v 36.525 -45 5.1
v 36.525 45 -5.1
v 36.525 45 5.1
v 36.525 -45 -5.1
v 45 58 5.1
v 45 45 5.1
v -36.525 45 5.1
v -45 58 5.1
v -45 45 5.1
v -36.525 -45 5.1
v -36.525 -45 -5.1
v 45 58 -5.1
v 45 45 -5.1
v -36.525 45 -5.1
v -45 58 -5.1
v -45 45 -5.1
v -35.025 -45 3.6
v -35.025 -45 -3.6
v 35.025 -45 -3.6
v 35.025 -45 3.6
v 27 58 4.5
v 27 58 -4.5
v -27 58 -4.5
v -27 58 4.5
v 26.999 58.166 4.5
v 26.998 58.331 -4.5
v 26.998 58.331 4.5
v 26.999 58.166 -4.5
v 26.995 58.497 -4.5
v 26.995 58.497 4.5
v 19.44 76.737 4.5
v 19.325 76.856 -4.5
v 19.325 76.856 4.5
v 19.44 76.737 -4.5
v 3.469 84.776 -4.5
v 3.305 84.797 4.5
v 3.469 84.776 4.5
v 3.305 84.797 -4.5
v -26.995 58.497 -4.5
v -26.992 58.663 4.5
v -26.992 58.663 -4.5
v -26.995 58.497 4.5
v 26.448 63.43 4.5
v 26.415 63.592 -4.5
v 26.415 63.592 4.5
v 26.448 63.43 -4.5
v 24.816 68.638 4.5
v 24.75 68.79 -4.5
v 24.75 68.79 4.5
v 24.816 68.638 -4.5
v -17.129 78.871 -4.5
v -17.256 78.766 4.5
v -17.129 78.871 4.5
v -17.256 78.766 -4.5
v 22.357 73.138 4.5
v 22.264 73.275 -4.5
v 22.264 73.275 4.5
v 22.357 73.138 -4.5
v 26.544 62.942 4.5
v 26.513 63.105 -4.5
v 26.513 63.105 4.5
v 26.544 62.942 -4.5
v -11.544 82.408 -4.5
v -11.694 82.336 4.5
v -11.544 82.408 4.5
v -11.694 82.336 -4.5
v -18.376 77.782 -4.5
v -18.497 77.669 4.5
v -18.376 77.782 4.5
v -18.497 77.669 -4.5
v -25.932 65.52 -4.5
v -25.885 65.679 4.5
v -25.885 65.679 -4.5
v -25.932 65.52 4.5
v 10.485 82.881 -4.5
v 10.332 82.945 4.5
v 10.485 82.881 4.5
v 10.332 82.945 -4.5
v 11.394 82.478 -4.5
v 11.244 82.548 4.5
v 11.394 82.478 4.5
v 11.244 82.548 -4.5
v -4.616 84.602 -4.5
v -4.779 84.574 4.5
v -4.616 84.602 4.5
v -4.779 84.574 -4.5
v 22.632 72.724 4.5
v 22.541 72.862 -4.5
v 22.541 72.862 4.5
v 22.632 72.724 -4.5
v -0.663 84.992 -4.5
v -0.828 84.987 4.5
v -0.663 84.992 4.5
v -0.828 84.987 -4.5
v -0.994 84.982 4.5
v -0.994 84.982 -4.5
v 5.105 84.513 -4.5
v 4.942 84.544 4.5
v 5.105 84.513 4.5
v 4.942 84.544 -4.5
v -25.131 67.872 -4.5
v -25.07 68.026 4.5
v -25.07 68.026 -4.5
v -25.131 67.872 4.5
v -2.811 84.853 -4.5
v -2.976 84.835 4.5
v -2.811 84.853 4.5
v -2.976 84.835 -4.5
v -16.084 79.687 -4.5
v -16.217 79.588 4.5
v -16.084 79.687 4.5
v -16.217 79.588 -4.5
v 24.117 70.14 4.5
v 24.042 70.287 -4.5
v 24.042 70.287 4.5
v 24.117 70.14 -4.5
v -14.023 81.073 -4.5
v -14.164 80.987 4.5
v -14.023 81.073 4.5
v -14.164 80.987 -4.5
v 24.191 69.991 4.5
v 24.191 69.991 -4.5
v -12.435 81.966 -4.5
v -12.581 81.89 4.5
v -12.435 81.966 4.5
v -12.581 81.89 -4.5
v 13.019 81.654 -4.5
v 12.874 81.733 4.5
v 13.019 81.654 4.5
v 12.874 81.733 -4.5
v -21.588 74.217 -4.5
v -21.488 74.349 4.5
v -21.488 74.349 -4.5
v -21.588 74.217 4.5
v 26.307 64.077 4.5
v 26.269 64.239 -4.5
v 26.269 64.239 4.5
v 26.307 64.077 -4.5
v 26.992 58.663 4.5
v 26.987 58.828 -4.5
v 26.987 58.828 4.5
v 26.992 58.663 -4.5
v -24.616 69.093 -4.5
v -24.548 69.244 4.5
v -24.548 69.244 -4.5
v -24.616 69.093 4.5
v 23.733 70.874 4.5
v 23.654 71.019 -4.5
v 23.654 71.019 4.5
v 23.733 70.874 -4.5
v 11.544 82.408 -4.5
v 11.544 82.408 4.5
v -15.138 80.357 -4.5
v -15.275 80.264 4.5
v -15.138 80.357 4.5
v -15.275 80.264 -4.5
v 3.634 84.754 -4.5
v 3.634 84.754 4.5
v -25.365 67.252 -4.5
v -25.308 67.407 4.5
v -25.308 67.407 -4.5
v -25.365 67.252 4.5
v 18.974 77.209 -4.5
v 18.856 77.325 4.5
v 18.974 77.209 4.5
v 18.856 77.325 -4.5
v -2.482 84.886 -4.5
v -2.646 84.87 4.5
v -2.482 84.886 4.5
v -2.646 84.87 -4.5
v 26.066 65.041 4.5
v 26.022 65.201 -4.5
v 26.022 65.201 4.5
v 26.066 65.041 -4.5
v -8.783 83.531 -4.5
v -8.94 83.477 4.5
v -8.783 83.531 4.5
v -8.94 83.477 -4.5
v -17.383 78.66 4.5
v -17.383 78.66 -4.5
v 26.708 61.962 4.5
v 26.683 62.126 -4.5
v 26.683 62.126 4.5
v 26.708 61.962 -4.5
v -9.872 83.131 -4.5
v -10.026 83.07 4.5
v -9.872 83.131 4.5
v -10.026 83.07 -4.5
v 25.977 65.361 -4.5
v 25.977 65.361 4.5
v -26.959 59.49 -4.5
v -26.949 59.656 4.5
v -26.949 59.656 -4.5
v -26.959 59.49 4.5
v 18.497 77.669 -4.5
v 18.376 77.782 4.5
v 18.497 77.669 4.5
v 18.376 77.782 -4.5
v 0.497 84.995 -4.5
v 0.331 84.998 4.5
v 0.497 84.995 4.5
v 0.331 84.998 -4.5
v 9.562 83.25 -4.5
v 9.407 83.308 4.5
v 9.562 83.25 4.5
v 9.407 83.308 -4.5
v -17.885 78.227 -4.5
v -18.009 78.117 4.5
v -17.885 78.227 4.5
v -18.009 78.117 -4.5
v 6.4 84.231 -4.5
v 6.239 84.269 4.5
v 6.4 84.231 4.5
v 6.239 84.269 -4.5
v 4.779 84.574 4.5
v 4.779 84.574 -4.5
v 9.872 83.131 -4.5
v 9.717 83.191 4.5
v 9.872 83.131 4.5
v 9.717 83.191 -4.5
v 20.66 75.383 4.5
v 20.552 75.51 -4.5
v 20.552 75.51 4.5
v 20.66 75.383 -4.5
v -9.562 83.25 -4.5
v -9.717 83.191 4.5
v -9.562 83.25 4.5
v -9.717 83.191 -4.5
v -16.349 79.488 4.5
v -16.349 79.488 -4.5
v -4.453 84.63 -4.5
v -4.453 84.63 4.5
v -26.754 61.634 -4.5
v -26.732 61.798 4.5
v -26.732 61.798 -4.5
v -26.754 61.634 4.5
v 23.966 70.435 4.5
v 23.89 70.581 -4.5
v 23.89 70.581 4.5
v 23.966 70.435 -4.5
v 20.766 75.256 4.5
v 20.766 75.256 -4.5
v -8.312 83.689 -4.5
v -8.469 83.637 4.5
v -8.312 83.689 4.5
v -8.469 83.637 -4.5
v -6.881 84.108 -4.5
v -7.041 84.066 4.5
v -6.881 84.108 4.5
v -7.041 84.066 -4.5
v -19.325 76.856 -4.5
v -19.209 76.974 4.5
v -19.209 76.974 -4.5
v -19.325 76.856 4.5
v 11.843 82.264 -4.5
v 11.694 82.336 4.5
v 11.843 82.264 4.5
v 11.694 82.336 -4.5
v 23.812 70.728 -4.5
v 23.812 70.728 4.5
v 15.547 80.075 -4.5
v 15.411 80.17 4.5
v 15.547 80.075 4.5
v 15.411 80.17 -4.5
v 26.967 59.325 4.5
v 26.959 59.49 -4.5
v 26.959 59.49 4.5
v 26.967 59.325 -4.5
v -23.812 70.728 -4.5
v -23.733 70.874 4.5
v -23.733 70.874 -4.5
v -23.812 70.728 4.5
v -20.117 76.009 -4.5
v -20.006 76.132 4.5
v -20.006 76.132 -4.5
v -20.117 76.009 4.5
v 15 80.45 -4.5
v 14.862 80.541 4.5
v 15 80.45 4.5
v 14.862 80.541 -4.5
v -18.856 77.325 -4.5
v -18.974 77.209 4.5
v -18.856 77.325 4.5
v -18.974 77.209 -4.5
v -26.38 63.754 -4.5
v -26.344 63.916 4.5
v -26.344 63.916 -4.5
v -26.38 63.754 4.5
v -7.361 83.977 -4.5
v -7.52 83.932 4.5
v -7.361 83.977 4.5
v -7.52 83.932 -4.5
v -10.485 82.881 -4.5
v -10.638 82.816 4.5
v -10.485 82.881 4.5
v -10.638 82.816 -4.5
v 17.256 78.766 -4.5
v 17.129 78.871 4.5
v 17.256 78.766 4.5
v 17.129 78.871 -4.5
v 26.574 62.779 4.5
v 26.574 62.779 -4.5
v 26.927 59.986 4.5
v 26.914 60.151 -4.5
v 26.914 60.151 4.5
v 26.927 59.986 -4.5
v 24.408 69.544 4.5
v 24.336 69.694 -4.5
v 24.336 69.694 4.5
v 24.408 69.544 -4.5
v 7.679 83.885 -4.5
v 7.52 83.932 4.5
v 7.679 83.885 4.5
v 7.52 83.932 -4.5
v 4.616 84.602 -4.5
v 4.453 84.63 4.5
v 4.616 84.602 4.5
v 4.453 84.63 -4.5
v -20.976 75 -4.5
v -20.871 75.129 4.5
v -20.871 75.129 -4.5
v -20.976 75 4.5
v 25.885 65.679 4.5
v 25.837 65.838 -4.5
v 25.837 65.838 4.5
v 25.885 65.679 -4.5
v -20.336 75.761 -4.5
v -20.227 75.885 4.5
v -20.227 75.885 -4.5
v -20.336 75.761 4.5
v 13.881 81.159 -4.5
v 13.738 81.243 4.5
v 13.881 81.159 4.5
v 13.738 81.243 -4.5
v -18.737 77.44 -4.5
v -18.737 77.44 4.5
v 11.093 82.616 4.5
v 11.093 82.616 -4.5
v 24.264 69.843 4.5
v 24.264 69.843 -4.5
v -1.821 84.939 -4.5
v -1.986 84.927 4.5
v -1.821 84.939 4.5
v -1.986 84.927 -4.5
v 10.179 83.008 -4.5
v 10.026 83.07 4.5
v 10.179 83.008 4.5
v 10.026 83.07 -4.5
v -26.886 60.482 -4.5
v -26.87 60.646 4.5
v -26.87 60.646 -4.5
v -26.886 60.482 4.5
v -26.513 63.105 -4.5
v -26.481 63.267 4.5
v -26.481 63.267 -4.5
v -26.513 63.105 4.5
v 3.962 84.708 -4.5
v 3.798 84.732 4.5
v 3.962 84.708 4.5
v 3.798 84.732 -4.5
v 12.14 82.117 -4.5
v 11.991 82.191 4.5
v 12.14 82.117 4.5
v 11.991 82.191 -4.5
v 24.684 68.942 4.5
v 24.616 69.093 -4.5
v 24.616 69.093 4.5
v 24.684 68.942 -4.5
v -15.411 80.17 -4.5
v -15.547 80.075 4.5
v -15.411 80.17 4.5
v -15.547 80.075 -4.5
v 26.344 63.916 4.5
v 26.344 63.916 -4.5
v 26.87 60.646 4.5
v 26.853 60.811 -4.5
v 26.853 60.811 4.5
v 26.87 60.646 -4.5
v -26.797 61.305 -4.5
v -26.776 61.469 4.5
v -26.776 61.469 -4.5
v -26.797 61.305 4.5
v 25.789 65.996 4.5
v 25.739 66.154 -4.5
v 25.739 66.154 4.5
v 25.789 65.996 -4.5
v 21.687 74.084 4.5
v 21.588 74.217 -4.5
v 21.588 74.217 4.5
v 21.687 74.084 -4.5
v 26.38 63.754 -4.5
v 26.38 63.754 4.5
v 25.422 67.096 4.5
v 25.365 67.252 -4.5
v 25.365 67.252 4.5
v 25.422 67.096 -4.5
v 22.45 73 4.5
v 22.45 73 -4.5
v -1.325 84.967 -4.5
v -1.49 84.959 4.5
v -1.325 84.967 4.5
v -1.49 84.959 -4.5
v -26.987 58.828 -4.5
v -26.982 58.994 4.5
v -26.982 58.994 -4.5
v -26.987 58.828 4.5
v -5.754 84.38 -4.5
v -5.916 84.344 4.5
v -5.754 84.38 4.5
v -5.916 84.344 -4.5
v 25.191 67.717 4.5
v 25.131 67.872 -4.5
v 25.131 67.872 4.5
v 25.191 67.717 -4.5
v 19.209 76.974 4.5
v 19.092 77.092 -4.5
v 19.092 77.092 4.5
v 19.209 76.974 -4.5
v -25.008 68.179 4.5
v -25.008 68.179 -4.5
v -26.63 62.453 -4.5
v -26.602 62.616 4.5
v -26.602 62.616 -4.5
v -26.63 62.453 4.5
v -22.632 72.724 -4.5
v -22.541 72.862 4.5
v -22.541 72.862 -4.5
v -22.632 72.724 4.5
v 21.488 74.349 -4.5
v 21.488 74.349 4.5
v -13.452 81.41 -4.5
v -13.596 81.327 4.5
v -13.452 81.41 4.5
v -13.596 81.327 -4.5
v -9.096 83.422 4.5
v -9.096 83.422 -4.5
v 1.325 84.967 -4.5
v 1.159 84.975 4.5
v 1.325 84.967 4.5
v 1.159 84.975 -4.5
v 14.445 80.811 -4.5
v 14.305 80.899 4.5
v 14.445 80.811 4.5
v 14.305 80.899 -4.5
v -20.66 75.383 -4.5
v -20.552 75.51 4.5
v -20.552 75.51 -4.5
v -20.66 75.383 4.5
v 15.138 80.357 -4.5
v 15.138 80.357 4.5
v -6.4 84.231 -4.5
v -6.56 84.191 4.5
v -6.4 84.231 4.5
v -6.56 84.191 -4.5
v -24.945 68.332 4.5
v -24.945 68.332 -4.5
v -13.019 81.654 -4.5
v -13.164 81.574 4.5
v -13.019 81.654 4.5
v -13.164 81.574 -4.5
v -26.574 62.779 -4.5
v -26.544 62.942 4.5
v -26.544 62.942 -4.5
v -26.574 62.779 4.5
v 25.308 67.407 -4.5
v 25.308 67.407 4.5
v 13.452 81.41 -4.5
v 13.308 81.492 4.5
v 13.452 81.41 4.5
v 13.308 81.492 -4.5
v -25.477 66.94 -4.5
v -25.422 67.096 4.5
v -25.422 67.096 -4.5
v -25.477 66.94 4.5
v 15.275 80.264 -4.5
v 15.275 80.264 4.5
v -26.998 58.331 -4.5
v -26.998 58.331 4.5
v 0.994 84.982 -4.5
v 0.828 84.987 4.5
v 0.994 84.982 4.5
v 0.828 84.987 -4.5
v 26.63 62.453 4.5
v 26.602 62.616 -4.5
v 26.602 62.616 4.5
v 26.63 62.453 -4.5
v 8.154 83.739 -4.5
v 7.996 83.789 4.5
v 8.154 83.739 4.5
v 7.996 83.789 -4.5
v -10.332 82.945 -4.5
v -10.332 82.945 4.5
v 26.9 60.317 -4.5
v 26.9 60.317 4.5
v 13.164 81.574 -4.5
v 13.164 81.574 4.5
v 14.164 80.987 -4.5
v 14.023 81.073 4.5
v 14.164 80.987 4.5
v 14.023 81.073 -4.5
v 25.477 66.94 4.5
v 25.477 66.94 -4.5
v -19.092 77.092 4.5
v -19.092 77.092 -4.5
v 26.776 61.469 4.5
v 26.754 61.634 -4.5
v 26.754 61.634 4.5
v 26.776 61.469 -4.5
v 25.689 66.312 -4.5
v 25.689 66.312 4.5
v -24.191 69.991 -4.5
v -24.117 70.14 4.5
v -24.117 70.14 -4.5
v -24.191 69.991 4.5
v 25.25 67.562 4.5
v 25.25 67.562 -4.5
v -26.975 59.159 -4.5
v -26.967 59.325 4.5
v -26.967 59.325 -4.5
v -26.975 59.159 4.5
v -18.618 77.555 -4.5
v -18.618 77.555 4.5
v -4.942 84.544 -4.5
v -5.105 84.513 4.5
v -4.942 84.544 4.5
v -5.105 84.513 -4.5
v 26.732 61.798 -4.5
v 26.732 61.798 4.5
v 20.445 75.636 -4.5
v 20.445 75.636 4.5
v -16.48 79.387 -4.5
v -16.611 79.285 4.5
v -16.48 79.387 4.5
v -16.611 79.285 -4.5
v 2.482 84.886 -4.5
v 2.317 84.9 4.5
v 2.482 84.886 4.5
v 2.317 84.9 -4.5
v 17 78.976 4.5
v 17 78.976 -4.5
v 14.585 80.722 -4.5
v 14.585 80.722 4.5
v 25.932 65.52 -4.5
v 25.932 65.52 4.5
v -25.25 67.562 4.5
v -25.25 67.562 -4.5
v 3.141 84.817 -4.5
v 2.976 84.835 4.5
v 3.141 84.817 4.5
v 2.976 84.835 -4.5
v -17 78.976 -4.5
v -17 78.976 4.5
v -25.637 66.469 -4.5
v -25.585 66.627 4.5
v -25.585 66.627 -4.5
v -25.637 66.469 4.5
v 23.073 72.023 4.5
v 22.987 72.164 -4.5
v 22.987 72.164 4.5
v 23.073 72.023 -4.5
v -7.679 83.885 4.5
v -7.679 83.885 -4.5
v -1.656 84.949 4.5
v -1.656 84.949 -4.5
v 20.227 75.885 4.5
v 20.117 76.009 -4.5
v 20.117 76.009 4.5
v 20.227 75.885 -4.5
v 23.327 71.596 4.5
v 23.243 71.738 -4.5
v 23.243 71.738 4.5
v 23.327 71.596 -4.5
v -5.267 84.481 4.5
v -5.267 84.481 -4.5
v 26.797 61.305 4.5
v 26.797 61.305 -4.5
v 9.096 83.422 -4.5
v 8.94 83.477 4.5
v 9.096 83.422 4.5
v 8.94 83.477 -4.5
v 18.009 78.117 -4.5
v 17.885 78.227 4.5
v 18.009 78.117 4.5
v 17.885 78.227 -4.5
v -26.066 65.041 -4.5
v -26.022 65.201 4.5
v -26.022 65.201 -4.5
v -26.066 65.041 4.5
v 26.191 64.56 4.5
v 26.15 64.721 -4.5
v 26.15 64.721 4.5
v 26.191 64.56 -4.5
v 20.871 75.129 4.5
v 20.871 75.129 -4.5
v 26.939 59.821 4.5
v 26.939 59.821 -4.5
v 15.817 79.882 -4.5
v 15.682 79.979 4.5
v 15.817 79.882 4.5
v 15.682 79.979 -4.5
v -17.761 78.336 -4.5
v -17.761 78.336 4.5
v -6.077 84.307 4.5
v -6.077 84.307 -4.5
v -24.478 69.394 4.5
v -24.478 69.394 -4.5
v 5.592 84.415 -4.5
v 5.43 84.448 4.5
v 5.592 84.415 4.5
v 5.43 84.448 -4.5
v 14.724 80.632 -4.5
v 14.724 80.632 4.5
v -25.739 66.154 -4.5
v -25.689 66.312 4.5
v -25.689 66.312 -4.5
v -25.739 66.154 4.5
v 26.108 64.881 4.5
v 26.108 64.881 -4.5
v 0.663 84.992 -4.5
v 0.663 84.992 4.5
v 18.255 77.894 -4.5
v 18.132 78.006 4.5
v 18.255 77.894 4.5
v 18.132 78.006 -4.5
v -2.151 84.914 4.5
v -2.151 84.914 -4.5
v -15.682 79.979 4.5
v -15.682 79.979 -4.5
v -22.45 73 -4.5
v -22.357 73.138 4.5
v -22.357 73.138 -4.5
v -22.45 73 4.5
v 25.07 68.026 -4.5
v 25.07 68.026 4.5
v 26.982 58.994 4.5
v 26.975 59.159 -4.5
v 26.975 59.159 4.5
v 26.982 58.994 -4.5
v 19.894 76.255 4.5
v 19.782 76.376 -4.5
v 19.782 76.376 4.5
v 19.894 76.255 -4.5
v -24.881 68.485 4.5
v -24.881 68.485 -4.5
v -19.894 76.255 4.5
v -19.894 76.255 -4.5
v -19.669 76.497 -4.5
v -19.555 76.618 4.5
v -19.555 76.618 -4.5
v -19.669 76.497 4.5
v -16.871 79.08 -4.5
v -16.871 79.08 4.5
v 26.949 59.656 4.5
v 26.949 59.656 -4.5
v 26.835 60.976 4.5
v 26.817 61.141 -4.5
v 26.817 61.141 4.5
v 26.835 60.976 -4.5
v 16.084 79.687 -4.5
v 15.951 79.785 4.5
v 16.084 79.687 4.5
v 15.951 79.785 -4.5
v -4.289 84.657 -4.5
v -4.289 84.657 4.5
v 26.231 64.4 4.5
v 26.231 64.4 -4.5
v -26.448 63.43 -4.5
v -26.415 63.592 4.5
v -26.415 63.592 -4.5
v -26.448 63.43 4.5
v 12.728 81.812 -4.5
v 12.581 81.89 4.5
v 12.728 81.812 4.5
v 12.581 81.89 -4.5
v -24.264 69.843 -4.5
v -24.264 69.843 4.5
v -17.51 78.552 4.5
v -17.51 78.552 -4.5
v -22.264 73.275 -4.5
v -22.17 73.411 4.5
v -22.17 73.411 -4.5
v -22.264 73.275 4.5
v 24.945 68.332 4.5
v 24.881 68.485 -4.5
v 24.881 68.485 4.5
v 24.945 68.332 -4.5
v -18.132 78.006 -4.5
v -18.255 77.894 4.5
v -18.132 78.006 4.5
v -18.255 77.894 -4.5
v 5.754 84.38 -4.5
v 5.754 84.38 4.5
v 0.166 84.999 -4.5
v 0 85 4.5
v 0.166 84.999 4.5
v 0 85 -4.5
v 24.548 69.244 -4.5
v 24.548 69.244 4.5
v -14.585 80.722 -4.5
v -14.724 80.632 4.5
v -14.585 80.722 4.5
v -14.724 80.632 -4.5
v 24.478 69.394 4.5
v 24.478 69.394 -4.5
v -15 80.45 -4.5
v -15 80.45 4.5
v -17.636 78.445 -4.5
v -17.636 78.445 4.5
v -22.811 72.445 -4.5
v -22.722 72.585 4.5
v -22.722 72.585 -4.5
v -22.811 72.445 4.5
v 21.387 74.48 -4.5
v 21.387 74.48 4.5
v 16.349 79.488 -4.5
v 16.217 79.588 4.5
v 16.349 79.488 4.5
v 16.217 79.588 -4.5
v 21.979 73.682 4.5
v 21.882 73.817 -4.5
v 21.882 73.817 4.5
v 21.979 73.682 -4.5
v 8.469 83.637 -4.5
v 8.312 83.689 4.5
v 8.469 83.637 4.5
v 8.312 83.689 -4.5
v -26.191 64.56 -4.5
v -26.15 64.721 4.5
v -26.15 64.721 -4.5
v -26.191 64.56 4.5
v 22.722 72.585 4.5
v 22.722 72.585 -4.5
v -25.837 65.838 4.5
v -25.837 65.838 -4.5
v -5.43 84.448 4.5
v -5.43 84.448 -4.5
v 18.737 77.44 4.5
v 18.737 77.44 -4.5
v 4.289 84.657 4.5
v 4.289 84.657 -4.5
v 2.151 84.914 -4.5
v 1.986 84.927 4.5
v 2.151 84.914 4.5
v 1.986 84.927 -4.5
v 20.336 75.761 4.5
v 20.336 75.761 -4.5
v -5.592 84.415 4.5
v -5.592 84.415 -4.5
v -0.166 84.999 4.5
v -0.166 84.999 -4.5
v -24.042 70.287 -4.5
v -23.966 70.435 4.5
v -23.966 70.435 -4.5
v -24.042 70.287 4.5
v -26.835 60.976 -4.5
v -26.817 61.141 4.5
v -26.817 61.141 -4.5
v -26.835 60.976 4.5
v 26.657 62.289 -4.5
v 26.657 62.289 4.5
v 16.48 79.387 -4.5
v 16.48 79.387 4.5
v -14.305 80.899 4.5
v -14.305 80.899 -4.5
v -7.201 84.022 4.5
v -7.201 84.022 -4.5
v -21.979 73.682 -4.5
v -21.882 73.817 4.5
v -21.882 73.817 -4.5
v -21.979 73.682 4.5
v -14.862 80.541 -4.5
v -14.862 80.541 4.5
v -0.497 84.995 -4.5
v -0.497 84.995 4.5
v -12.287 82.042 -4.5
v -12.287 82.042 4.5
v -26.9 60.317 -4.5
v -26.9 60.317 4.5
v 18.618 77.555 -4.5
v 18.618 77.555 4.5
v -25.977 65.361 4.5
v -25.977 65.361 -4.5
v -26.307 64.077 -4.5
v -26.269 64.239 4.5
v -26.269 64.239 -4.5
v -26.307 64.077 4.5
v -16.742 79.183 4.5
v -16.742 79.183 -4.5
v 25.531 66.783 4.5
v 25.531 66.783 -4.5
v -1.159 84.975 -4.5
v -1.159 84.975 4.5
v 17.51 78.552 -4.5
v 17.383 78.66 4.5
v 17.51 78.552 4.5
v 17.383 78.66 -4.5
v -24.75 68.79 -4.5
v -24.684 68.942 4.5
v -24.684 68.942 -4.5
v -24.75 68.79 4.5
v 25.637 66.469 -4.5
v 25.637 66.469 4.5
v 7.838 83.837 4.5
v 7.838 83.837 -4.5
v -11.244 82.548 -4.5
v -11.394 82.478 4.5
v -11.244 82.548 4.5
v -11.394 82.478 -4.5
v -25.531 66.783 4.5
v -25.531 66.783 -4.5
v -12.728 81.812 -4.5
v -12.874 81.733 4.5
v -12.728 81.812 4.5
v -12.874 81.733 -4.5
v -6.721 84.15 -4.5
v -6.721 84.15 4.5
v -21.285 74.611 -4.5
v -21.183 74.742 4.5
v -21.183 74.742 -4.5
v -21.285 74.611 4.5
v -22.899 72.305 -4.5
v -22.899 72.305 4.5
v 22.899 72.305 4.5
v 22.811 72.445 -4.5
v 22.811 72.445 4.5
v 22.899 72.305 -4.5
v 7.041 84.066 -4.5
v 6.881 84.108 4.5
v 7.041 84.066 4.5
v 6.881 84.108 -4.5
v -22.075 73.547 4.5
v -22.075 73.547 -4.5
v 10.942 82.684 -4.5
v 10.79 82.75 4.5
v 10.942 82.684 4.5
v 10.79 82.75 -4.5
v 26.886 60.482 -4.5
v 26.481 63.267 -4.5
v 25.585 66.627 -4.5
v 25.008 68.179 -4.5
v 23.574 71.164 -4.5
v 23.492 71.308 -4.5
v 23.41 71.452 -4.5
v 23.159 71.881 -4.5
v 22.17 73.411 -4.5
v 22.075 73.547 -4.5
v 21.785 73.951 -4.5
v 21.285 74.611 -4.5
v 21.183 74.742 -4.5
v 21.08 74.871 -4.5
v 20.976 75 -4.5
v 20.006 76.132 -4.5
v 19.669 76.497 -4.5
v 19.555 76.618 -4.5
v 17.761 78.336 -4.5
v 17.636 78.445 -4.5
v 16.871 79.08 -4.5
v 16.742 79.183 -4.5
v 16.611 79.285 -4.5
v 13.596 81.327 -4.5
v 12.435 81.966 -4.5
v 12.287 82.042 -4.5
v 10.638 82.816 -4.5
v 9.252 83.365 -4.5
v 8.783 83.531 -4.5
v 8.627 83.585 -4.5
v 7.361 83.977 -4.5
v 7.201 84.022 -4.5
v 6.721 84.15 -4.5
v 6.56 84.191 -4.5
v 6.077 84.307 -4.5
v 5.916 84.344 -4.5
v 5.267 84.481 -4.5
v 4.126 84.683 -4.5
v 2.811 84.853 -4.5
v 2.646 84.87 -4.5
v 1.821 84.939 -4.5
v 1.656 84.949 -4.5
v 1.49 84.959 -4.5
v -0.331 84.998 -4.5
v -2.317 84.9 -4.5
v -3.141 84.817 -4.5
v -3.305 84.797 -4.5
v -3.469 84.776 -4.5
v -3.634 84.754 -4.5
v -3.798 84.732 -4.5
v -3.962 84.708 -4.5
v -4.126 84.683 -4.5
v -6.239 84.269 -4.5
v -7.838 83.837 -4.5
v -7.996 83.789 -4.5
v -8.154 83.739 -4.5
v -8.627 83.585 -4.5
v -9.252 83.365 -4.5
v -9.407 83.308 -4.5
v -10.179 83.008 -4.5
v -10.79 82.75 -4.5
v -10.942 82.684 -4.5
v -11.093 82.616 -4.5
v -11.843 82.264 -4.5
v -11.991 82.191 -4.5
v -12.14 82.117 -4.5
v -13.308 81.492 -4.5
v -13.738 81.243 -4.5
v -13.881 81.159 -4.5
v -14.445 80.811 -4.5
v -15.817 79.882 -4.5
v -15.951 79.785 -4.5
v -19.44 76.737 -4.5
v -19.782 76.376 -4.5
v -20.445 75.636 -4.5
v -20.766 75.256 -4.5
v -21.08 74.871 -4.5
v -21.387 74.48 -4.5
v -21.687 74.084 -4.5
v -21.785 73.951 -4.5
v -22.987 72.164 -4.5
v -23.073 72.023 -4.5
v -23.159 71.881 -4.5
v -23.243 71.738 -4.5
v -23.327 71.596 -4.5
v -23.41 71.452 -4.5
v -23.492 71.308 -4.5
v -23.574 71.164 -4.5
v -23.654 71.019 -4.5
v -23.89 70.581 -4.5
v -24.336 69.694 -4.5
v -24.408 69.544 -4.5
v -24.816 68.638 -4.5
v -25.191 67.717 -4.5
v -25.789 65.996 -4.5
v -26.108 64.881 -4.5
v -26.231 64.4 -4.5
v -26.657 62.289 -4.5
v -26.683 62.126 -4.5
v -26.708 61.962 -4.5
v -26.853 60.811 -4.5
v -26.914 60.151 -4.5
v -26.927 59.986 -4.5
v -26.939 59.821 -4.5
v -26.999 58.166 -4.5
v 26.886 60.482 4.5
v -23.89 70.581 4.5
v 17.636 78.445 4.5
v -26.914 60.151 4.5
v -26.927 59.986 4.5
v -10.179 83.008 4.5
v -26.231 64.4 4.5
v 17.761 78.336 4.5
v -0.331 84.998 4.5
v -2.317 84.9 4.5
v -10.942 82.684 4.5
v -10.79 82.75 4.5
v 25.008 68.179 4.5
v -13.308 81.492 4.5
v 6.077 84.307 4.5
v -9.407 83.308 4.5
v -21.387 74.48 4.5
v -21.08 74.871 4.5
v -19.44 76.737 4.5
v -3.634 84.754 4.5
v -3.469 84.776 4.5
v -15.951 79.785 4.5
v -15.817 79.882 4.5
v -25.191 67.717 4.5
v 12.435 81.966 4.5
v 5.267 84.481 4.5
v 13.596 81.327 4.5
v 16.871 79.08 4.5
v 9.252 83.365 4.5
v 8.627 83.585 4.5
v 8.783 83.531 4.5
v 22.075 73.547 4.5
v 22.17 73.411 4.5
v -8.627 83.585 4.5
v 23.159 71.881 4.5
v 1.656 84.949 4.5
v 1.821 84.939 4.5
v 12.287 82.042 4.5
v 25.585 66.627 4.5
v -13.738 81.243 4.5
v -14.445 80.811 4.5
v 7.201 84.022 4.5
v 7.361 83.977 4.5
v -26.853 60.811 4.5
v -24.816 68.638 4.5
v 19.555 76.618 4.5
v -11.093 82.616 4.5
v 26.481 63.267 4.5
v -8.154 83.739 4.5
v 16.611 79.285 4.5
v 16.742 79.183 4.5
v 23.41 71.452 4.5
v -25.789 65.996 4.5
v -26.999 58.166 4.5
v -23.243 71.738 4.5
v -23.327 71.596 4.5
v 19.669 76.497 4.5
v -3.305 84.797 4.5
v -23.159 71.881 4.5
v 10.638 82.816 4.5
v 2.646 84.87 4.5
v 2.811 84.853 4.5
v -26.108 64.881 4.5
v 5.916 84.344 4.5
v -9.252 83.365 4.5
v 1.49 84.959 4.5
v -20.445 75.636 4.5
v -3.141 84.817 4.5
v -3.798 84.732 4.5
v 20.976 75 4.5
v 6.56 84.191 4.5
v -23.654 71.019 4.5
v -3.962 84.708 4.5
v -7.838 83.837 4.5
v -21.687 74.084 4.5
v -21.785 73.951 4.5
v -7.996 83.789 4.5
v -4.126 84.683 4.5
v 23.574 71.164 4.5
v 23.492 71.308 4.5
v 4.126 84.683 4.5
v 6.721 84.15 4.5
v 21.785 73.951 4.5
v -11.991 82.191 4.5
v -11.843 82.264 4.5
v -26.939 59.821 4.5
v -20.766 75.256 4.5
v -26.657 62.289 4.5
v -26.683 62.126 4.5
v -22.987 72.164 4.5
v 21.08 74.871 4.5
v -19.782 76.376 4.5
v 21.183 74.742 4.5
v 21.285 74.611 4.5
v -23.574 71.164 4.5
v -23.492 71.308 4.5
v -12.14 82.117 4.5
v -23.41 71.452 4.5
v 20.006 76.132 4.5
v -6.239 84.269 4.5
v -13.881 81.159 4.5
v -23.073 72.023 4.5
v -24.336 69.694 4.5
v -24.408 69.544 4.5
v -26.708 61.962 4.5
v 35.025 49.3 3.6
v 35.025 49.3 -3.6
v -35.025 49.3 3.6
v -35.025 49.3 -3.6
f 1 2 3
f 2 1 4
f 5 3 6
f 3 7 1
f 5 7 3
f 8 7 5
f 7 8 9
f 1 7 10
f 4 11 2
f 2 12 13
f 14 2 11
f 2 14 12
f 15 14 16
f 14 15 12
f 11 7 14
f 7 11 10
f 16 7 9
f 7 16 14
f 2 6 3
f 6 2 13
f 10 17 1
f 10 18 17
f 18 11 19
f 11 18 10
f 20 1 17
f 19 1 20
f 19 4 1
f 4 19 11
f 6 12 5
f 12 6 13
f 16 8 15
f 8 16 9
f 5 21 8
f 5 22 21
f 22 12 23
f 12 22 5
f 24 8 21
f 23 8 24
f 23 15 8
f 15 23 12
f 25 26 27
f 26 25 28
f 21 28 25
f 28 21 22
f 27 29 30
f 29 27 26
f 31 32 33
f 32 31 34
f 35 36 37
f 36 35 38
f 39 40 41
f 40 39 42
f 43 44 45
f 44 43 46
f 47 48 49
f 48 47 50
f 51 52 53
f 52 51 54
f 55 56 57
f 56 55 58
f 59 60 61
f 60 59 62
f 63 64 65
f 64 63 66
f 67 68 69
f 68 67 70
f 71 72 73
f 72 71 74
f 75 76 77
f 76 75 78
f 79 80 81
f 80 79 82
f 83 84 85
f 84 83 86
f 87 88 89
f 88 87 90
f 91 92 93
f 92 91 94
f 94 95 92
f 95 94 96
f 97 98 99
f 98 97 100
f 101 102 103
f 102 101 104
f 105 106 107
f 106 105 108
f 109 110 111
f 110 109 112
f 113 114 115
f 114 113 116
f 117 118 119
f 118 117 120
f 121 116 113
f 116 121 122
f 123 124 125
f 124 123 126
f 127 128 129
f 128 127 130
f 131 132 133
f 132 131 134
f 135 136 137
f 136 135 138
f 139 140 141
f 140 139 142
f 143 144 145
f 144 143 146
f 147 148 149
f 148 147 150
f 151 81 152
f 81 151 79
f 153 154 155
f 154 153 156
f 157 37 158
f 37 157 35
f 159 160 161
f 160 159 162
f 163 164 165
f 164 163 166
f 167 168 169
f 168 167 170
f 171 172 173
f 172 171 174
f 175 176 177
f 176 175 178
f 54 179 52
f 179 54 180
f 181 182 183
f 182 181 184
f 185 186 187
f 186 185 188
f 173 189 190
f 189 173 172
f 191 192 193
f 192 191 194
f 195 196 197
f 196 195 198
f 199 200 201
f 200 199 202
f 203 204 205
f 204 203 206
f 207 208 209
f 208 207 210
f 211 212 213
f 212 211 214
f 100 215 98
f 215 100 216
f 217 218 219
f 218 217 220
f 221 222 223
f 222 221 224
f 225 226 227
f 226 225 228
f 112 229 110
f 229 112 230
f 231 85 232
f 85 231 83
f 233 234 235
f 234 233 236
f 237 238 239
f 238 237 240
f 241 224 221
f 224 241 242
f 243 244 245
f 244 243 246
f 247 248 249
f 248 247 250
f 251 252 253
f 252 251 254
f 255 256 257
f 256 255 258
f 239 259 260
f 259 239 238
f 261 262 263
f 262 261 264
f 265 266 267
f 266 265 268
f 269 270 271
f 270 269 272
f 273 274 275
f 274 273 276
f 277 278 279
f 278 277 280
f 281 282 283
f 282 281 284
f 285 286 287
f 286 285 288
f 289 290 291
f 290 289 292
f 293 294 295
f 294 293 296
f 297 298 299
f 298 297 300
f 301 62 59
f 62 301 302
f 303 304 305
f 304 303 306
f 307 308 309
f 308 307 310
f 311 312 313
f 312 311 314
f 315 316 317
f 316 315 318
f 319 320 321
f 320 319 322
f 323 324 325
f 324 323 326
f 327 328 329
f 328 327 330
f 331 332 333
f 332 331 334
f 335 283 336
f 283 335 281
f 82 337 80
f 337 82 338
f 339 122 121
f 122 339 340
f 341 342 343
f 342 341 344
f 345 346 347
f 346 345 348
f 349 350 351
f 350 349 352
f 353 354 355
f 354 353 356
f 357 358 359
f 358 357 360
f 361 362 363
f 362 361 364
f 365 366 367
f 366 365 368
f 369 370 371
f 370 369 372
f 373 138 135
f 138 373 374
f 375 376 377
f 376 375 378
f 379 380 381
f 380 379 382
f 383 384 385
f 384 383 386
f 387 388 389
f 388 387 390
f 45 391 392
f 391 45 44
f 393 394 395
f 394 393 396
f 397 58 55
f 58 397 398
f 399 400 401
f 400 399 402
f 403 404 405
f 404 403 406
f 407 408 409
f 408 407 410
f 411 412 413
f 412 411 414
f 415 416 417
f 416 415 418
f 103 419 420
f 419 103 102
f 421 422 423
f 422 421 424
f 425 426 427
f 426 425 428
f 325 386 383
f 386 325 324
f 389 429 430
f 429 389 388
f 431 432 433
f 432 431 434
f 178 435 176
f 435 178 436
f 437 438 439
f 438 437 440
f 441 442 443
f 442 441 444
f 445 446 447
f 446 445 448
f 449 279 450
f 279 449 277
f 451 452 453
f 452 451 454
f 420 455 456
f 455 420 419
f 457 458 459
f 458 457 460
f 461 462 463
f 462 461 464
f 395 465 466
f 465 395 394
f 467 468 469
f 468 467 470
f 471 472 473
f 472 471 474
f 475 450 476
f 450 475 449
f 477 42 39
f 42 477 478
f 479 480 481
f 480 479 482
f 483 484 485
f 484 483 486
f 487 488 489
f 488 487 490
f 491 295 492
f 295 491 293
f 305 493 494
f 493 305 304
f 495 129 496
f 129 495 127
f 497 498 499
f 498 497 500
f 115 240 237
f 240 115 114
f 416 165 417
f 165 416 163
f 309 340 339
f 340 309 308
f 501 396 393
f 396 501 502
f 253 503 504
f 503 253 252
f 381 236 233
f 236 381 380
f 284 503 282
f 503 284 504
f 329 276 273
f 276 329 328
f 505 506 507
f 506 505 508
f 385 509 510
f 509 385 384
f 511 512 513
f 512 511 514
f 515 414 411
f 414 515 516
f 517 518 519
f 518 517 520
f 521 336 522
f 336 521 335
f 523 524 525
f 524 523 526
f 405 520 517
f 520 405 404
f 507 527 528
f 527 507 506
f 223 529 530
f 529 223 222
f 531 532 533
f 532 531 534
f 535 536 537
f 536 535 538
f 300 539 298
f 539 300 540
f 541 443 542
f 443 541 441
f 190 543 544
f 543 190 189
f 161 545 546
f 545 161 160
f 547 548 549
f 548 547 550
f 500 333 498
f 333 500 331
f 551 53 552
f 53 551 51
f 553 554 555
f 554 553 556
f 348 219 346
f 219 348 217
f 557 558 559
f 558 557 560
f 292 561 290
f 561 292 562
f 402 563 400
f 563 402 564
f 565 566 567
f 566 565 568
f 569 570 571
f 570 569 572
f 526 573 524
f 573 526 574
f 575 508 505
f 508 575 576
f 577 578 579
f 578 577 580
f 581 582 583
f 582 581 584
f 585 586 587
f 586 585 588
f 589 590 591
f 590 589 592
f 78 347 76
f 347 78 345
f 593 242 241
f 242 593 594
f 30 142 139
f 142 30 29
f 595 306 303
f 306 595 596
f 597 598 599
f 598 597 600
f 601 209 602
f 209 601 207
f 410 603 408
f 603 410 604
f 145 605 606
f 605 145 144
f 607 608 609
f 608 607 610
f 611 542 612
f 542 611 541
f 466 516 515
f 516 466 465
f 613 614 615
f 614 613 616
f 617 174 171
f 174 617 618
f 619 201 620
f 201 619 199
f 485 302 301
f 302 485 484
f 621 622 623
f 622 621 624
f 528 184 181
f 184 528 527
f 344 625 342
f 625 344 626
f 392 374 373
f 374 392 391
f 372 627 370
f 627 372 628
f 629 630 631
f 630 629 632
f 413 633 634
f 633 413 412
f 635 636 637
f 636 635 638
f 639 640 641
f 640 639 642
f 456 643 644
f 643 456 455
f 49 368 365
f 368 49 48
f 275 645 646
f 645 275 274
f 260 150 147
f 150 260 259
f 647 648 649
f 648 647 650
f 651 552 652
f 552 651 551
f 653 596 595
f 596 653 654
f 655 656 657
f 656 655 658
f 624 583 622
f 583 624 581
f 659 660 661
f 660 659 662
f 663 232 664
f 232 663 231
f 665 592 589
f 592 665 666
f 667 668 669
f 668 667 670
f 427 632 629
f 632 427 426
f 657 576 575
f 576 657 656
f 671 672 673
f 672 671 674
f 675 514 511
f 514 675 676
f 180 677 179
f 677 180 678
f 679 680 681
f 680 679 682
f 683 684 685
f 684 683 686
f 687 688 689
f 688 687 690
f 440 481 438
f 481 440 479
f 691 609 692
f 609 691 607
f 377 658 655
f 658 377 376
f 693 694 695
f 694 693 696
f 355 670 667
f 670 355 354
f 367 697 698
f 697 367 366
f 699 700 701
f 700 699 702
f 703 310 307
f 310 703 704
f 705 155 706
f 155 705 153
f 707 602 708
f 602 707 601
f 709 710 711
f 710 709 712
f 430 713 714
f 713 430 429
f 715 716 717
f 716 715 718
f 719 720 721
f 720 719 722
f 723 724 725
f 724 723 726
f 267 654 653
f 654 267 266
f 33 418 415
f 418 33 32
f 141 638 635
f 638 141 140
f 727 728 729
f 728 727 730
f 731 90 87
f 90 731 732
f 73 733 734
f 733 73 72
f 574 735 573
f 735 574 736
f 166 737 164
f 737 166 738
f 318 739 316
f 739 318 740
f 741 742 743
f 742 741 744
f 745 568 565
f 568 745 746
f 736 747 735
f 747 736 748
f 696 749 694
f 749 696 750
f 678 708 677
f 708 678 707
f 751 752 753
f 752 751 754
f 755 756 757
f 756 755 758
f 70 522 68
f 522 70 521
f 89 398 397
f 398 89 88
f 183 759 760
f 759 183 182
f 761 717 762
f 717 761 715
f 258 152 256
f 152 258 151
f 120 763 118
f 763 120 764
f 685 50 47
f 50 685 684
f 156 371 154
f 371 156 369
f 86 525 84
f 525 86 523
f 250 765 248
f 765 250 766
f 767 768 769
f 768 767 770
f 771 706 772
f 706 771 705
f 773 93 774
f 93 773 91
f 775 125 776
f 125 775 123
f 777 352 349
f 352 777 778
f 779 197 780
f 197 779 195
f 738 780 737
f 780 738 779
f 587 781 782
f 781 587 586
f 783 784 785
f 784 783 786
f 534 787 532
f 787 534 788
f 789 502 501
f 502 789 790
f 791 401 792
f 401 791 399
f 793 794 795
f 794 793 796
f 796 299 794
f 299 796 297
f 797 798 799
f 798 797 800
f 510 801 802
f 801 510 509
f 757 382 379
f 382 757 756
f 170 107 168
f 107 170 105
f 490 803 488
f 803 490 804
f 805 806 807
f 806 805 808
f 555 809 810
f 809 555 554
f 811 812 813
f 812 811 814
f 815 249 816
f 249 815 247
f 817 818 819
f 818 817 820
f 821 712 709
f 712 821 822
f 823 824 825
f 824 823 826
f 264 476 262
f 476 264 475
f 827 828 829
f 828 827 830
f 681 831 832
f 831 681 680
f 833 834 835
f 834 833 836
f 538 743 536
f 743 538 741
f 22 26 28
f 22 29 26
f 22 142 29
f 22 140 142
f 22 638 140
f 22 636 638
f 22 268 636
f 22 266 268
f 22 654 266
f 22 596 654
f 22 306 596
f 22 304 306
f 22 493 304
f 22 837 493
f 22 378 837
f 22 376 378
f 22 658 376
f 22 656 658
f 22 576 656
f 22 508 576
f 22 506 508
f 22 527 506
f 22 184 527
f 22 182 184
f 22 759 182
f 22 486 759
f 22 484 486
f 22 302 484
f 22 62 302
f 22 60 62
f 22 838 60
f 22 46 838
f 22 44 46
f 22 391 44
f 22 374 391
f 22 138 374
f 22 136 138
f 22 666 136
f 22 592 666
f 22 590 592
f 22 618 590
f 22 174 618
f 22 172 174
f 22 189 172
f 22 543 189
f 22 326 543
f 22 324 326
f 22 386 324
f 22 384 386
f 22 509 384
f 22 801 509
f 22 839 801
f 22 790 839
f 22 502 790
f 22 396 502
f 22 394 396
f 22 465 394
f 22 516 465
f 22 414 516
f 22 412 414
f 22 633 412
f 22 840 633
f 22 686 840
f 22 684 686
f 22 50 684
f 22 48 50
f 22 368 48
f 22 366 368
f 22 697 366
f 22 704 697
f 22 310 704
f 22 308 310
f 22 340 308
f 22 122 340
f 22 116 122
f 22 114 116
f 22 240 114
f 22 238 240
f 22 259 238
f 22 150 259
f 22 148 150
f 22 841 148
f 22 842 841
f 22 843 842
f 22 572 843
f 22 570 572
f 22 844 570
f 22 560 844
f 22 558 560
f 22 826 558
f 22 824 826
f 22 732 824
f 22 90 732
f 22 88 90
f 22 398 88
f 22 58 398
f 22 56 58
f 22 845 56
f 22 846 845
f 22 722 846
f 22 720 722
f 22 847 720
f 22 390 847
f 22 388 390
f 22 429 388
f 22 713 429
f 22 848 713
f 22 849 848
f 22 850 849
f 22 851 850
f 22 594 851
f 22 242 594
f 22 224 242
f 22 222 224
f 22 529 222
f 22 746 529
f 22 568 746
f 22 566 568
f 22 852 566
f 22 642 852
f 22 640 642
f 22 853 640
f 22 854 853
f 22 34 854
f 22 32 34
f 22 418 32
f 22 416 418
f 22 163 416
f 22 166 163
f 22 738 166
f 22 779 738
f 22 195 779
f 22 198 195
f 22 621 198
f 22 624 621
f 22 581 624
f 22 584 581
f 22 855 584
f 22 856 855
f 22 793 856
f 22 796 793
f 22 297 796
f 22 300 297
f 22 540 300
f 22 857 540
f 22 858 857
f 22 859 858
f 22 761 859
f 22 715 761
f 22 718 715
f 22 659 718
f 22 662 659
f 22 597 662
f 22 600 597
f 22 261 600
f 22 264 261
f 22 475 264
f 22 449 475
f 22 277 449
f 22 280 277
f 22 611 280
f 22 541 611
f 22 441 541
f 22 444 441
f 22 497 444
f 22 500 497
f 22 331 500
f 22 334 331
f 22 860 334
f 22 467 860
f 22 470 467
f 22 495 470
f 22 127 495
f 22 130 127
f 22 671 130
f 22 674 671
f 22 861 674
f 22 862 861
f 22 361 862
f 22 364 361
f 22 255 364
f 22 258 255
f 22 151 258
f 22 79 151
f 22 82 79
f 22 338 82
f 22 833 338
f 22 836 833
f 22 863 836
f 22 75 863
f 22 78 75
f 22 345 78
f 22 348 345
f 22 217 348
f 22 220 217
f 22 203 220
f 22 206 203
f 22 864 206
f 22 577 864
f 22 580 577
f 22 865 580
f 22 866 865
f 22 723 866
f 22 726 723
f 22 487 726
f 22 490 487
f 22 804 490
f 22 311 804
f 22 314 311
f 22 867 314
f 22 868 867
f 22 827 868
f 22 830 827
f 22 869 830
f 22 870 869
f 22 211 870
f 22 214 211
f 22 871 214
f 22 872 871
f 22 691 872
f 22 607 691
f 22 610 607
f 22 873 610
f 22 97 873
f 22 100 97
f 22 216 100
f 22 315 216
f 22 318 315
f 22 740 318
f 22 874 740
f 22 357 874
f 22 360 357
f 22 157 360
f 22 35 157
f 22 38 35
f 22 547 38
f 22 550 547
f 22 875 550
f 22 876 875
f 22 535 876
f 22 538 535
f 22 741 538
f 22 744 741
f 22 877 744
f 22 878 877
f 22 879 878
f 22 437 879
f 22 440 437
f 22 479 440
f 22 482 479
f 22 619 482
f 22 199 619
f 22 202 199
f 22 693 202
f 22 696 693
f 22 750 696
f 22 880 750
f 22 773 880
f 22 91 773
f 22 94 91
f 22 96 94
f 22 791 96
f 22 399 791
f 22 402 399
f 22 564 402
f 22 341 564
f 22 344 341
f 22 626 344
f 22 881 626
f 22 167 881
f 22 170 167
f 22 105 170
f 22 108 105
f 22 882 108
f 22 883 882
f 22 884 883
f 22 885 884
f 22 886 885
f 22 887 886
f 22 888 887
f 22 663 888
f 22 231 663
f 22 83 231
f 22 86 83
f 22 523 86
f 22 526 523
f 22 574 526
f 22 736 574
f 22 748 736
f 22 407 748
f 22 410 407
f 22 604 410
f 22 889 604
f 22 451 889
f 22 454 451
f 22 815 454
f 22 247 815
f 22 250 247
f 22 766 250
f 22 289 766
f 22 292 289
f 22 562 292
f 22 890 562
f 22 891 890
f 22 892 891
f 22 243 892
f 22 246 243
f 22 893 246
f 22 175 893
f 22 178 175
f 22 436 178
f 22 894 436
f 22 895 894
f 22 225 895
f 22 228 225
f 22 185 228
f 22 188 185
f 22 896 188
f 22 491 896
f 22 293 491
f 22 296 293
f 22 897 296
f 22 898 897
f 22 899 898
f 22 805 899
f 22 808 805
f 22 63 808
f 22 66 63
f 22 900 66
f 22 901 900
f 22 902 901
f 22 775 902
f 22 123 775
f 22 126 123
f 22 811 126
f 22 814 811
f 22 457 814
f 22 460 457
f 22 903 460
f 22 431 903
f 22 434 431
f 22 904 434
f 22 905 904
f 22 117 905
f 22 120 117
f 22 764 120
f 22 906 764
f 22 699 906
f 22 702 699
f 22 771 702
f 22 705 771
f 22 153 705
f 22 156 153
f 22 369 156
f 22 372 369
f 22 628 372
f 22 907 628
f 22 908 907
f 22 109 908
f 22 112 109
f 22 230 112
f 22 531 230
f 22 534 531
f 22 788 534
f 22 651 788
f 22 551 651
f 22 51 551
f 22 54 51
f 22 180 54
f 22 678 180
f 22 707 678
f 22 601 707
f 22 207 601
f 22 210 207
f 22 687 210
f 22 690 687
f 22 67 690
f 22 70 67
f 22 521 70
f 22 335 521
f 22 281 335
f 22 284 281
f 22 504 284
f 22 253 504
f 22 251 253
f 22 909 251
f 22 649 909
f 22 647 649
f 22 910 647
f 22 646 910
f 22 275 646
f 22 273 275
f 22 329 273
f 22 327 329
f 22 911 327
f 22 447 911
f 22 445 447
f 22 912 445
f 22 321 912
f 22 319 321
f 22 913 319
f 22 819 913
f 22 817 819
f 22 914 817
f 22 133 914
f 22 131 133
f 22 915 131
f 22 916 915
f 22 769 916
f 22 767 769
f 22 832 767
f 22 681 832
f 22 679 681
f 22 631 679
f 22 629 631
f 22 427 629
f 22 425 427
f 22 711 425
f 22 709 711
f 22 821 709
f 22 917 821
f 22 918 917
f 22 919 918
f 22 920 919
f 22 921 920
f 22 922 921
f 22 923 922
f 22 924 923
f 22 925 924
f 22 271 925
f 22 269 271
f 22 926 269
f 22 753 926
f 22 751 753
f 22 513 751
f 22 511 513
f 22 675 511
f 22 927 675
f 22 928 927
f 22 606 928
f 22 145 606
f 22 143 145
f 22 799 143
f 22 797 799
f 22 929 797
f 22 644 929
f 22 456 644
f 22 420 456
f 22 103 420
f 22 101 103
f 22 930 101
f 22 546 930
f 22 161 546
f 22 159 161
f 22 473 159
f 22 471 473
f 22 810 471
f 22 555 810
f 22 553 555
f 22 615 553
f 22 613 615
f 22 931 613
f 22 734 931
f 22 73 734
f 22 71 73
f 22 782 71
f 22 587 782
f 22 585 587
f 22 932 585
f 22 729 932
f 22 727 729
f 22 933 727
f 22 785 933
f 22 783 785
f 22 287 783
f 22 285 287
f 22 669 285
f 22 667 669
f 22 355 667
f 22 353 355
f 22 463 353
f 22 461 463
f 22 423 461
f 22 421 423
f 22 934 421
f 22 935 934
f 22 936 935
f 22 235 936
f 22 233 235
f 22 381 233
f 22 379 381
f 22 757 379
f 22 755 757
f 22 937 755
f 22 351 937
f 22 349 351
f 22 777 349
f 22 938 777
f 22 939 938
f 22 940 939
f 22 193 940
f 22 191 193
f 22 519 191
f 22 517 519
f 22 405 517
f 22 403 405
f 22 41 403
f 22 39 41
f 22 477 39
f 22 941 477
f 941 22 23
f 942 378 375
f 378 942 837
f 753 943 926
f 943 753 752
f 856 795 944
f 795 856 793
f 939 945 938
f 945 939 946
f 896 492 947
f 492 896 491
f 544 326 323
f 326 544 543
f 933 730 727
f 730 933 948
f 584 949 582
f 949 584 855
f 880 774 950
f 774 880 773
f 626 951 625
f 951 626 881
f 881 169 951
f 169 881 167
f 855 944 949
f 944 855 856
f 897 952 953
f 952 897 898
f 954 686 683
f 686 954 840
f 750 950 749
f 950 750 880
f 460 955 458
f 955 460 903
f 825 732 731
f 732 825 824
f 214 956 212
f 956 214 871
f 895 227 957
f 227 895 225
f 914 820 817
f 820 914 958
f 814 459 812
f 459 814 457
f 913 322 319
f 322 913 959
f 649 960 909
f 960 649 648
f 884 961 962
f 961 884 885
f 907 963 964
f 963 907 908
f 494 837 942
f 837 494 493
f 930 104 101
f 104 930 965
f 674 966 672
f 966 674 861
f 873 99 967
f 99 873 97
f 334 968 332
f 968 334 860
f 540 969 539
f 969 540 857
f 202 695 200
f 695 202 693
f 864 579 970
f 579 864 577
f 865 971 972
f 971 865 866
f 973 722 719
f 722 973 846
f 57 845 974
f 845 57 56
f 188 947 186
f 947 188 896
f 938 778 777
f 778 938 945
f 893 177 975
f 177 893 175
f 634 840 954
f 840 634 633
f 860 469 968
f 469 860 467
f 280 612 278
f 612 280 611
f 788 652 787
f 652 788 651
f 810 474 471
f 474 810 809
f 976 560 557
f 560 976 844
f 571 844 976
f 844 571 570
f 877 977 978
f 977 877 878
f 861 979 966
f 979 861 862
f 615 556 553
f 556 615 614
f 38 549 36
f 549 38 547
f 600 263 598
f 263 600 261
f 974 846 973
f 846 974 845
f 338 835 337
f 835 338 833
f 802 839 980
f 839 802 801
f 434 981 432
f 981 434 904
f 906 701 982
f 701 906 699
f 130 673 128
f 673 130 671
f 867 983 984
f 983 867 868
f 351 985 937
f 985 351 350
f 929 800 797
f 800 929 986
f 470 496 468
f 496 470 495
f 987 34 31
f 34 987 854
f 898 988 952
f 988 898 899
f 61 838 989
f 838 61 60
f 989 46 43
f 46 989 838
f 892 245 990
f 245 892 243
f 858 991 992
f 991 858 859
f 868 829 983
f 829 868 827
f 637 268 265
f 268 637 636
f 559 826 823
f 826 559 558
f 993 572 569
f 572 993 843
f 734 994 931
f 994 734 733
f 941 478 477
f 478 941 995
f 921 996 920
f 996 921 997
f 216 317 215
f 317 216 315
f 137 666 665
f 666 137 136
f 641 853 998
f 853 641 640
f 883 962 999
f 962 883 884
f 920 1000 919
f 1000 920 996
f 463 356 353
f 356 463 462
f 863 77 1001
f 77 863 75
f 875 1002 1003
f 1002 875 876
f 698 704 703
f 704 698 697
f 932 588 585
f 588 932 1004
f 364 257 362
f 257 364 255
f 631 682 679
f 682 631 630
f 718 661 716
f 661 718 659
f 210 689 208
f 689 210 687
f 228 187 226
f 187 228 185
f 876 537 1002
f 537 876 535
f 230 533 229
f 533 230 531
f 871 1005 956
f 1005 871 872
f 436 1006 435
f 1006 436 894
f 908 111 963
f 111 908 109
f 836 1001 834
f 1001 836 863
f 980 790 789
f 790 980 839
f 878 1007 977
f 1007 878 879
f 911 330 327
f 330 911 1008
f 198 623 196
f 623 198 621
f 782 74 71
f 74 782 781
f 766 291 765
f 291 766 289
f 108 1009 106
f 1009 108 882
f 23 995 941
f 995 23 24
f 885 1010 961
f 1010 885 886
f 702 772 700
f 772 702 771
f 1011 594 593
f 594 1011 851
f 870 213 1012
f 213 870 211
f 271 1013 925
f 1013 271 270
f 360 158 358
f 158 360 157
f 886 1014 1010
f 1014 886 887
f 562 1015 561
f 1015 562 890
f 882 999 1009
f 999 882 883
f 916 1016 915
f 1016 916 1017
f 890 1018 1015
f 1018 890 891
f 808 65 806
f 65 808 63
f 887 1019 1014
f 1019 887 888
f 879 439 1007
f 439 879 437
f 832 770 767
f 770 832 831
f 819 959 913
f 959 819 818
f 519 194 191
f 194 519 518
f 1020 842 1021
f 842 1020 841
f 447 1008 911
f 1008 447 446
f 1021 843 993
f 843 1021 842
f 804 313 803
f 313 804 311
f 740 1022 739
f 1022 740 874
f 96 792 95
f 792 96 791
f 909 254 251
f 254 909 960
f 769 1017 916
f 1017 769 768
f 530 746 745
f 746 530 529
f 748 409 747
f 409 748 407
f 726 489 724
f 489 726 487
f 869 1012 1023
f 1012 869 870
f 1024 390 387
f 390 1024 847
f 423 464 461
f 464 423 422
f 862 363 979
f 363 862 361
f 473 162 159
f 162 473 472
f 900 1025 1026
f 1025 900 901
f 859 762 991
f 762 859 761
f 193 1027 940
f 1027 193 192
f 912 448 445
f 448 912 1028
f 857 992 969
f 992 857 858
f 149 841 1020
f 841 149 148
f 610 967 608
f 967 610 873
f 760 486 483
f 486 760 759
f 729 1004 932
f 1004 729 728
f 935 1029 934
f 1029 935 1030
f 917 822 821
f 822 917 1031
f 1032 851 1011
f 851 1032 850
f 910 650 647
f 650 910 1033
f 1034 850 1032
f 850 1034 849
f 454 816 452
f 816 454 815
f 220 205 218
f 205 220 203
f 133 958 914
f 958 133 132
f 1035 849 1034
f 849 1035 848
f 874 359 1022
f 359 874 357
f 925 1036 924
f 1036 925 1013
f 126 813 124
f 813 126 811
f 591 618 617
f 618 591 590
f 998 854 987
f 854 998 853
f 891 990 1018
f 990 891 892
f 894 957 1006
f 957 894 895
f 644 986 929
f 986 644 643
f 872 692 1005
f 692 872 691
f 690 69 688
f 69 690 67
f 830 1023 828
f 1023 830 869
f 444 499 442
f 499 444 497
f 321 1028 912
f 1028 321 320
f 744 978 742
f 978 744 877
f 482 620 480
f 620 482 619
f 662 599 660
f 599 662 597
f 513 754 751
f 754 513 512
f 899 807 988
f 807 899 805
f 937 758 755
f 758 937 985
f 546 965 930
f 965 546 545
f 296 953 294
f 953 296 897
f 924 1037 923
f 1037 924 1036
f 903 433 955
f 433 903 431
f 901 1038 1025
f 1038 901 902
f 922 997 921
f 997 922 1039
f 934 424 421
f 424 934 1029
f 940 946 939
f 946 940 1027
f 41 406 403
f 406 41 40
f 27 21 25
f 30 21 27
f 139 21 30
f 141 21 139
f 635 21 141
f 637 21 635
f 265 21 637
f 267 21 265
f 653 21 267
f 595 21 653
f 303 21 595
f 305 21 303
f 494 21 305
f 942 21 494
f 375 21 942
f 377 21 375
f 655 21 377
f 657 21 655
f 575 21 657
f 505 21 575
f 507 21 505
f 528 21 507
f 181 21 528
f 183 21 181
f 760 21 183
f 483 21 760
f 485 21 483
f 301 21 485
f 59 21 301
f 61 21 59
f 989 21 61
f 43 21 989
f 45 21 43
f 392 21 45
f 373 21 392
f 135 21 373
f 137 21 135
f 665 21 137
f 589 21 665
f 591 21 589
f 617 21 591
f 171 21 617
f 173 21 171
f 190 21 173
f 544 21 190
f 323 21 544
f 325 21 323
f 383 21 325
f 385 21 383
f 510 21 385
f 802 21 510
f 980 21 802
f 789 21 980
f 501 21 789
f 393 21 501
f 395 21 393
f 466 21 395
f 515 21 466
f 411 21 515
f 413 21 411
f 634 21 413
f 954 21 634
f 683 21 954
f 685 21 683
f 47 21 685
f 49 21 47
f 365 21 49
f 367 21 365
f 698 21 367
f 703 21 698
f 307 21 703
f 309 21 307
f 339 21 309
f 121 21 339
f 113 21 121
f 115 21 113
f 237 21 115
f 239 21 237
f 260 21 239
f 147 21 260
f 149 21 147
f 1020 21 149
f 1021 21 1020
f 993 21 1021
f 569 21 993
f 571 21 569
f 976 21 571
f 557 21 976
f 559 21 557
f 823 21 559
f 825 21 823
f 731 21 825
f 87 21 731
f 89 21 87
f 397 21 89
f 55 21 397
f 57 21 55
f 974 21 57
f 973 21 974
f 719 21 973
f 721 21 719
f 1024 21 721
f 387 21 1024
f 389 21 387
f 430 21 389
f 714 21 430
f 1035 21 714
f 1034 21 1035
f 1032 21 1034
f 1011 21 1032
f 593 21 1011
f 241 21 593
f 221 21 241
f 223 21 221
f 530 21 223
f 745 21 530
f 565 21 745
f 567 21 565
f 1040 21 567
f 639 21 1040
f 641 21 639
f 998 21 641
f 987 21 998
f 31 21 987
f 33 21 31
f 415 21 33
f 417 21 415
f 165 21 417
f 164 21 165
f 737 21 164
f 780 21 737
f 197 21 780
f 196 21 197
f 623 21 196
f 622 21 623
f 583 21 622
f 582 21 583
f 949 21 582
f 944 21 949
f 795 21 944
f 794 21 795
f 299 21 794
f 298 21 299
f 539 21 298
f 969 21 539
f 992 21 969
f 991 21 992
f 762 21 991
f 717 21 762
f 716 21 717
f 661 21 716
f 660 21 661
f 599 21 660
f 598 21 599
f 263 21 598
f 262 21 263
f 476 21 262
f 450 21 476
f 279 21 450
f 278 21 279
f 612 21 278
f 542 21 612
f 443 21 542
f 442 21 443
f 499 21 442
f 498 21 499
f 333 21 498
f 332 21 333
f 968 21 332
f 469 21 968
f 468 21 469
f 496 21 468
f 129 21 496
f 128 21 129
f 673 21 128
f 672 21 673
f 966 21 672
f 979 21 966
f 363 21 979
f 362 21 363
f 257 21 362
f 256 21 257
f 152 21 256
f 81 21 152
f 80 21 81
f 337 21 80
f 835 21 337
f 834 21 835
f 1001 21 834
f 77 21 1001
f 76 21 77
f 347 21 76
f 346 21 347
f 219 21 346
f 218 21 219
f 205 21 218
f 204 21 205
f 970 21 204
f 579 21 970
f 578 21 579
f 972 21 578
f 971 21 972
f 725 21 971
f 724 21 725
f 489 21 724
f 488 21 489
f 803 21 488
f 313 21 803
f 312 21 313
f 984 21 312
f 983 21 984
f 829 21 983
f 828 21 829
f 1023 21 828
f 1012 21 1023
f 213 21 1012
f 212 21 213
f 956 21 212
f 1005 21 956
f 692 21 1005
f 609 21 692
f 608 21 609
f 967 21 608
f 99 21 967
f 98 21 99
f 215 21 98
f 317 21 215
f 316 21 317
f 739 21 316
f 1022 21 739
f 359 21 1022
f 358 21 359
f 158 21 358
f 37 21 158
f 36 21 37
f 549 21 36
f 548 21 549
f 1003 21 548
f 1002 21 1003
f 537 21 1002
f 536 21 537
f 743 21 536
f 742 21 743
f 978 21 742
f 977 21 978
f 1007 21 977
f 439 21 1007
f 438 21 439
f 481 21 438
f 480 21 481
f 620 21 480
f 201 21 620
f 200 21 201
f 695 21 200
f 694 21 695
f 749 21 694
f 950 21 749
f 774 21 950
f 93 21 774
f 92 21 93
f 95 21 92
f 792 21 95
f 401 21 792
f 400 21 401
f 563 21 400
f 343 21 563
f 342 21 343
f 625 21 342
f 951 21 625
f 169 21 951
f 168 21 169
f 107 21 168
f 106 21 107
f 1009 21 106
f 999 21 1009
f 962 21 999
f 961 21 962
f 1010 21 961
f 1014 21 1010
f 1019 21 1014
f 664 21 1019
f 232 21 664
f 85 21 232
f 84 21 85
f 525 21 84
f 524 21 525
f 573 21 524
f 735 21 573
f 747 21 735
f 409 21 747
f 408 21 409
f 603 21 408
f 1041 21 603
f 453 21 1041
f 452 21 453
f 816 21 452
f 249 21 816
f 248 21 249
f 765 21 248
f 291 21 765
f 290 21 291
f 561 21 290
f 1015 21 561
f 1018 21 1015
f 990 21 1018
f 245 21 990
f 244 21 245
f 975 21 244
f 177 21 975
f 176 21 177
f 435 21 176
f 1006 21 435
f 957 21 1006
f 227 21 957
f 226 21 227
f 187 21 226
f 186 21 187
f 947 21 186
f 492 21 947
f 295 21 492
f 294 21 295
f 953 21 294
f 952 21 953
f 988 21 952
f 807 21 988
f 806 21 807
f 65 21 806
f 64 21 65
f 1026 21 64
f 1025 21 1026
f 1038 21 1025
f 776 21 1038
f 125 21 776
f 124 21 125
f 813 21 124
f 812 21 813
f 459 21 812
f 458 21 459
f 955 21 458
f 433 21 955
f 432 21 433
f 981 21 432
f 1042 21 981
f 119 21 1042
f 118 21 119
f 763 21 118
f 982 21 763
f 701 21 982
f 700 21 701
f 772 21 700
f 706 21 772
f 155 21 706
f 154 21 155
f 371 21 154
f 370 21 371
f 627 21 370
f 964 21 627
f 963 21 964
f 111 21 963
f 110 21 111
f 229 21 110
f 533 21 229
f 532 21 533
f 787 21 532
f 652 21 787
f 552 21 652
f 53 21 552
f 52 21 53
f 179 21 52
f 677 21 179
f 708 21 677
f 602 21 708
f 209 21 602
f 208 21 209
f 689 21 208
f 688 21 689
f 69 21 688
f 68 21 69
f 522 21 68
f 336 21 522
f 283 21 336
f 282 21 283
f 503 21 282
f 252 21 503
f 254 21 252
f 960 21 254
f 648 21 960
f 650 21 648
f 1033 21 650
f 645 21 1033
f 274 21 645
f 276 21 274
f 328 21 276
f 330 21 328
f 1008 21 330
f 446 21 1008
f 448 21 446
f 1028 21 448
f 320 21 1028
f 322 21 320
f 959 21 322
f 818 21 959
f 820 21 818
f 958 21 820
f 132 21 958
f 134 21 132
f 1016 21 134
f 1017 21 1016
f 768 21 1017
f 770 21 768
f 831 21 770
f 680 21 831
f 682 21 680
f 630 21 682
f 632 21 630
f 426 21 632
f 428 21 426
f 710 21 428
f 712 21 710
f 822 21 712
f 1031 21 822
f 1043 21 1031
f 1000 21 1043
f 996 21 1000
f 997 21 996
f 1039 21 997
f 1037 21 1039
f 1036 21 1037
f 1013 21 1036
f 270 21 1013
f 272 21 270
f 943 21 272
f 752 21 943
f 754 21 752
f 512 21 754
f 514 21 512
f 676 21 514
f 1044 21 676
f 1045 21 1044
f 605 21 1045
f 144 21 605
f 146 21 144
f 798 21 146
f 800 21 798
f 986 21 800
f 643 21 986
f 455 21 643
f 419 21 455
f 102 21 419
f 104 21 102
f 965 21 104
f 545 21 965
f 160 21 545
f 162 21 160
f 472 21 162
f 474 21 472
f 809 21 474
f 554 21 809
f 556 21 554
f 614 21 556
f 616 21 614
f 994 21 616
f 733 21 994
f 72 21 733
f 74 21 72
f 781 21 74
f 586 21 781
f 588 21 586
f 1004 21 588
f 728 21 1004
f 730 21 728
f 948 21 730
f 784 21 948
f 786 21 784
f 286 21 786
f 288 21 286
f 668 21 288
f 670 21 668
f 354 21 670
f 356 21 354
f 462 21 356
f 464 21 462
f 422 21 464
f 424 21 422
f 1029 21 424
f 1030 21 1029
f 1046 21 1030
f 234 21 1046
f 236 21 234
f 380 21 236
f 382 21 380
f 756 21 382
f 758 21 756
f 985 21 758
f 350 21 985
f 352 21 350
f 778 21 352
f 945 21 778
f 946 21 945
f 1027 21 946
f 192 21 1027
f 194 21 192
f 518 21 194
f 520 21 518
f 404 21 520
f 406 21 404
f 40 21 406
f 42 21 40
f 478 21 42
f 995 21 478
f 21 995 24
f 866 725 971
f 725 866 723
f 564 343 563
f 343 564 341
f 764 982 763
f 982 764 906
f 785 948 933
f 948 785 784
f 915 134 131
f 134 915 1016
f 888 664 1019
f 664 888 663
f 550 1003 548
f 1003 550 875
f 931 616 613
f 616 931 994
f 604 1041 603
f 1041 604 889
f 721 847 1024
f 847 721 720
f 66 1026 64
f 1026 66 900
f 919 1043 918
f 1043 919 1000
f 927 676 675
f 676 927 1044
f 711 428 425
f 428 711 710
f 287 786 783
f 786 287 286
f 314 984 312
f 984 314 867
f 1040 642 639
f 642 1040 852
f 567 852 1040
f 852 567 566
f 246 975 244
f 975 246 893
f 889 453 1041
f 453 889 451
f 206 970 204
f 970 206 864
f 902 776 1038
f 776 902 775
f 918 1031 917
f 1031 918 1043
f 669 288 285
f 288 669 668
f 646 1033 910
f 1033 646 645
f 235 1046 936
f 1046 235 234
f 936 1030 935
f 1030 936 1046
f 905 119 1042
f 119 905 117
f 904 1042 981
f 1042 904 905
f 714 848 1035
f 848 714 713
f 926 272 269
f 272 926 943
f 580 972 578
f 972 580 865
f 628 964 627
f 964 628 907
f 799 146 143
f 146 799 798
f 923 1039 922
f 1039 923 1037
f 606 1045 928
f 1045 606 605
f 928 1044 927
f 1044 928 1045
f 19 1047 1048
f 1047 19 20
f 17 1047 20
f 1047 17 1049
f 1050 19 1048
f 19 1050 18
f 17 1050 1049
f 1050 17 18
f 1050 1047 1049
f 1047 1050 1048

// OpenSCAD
tolerance = 0.2;
drivewidth = 69.85;
drivelength = 100.2;
driveheight = 7;
driveexposed = tolerance*2;
bodylength = 90;
bodywidth = 73.05;
bodyheight = 10.2;
tabwidth1 = 90;
tablength1 = 13;
tabheight1 = 10.2;
tabradius2 = 27;
tabheight2 = 9;
difference() {
    union() {
        cube([bodywidth,bodylength,bodyheight],center=true); //the large rectangle containing the drive
        translate([0,bodylength/2+tablength1/2,0])
        cube([tabwidth1,tablength1,tabheight1],center=true); //the wide square tab
        translate([0,bodylength/2+tablength1,0])
        cylinder(tabheight2,tabradius2,tabradius2,center=true,$fn=1024);
    } //the cylindrical top tab
    translate([0,-(driveexposed*2),0])
    cube([drivewidth+tolerance,drivelength,driveheight+tolerance],center=true); //the drive cutout
}
